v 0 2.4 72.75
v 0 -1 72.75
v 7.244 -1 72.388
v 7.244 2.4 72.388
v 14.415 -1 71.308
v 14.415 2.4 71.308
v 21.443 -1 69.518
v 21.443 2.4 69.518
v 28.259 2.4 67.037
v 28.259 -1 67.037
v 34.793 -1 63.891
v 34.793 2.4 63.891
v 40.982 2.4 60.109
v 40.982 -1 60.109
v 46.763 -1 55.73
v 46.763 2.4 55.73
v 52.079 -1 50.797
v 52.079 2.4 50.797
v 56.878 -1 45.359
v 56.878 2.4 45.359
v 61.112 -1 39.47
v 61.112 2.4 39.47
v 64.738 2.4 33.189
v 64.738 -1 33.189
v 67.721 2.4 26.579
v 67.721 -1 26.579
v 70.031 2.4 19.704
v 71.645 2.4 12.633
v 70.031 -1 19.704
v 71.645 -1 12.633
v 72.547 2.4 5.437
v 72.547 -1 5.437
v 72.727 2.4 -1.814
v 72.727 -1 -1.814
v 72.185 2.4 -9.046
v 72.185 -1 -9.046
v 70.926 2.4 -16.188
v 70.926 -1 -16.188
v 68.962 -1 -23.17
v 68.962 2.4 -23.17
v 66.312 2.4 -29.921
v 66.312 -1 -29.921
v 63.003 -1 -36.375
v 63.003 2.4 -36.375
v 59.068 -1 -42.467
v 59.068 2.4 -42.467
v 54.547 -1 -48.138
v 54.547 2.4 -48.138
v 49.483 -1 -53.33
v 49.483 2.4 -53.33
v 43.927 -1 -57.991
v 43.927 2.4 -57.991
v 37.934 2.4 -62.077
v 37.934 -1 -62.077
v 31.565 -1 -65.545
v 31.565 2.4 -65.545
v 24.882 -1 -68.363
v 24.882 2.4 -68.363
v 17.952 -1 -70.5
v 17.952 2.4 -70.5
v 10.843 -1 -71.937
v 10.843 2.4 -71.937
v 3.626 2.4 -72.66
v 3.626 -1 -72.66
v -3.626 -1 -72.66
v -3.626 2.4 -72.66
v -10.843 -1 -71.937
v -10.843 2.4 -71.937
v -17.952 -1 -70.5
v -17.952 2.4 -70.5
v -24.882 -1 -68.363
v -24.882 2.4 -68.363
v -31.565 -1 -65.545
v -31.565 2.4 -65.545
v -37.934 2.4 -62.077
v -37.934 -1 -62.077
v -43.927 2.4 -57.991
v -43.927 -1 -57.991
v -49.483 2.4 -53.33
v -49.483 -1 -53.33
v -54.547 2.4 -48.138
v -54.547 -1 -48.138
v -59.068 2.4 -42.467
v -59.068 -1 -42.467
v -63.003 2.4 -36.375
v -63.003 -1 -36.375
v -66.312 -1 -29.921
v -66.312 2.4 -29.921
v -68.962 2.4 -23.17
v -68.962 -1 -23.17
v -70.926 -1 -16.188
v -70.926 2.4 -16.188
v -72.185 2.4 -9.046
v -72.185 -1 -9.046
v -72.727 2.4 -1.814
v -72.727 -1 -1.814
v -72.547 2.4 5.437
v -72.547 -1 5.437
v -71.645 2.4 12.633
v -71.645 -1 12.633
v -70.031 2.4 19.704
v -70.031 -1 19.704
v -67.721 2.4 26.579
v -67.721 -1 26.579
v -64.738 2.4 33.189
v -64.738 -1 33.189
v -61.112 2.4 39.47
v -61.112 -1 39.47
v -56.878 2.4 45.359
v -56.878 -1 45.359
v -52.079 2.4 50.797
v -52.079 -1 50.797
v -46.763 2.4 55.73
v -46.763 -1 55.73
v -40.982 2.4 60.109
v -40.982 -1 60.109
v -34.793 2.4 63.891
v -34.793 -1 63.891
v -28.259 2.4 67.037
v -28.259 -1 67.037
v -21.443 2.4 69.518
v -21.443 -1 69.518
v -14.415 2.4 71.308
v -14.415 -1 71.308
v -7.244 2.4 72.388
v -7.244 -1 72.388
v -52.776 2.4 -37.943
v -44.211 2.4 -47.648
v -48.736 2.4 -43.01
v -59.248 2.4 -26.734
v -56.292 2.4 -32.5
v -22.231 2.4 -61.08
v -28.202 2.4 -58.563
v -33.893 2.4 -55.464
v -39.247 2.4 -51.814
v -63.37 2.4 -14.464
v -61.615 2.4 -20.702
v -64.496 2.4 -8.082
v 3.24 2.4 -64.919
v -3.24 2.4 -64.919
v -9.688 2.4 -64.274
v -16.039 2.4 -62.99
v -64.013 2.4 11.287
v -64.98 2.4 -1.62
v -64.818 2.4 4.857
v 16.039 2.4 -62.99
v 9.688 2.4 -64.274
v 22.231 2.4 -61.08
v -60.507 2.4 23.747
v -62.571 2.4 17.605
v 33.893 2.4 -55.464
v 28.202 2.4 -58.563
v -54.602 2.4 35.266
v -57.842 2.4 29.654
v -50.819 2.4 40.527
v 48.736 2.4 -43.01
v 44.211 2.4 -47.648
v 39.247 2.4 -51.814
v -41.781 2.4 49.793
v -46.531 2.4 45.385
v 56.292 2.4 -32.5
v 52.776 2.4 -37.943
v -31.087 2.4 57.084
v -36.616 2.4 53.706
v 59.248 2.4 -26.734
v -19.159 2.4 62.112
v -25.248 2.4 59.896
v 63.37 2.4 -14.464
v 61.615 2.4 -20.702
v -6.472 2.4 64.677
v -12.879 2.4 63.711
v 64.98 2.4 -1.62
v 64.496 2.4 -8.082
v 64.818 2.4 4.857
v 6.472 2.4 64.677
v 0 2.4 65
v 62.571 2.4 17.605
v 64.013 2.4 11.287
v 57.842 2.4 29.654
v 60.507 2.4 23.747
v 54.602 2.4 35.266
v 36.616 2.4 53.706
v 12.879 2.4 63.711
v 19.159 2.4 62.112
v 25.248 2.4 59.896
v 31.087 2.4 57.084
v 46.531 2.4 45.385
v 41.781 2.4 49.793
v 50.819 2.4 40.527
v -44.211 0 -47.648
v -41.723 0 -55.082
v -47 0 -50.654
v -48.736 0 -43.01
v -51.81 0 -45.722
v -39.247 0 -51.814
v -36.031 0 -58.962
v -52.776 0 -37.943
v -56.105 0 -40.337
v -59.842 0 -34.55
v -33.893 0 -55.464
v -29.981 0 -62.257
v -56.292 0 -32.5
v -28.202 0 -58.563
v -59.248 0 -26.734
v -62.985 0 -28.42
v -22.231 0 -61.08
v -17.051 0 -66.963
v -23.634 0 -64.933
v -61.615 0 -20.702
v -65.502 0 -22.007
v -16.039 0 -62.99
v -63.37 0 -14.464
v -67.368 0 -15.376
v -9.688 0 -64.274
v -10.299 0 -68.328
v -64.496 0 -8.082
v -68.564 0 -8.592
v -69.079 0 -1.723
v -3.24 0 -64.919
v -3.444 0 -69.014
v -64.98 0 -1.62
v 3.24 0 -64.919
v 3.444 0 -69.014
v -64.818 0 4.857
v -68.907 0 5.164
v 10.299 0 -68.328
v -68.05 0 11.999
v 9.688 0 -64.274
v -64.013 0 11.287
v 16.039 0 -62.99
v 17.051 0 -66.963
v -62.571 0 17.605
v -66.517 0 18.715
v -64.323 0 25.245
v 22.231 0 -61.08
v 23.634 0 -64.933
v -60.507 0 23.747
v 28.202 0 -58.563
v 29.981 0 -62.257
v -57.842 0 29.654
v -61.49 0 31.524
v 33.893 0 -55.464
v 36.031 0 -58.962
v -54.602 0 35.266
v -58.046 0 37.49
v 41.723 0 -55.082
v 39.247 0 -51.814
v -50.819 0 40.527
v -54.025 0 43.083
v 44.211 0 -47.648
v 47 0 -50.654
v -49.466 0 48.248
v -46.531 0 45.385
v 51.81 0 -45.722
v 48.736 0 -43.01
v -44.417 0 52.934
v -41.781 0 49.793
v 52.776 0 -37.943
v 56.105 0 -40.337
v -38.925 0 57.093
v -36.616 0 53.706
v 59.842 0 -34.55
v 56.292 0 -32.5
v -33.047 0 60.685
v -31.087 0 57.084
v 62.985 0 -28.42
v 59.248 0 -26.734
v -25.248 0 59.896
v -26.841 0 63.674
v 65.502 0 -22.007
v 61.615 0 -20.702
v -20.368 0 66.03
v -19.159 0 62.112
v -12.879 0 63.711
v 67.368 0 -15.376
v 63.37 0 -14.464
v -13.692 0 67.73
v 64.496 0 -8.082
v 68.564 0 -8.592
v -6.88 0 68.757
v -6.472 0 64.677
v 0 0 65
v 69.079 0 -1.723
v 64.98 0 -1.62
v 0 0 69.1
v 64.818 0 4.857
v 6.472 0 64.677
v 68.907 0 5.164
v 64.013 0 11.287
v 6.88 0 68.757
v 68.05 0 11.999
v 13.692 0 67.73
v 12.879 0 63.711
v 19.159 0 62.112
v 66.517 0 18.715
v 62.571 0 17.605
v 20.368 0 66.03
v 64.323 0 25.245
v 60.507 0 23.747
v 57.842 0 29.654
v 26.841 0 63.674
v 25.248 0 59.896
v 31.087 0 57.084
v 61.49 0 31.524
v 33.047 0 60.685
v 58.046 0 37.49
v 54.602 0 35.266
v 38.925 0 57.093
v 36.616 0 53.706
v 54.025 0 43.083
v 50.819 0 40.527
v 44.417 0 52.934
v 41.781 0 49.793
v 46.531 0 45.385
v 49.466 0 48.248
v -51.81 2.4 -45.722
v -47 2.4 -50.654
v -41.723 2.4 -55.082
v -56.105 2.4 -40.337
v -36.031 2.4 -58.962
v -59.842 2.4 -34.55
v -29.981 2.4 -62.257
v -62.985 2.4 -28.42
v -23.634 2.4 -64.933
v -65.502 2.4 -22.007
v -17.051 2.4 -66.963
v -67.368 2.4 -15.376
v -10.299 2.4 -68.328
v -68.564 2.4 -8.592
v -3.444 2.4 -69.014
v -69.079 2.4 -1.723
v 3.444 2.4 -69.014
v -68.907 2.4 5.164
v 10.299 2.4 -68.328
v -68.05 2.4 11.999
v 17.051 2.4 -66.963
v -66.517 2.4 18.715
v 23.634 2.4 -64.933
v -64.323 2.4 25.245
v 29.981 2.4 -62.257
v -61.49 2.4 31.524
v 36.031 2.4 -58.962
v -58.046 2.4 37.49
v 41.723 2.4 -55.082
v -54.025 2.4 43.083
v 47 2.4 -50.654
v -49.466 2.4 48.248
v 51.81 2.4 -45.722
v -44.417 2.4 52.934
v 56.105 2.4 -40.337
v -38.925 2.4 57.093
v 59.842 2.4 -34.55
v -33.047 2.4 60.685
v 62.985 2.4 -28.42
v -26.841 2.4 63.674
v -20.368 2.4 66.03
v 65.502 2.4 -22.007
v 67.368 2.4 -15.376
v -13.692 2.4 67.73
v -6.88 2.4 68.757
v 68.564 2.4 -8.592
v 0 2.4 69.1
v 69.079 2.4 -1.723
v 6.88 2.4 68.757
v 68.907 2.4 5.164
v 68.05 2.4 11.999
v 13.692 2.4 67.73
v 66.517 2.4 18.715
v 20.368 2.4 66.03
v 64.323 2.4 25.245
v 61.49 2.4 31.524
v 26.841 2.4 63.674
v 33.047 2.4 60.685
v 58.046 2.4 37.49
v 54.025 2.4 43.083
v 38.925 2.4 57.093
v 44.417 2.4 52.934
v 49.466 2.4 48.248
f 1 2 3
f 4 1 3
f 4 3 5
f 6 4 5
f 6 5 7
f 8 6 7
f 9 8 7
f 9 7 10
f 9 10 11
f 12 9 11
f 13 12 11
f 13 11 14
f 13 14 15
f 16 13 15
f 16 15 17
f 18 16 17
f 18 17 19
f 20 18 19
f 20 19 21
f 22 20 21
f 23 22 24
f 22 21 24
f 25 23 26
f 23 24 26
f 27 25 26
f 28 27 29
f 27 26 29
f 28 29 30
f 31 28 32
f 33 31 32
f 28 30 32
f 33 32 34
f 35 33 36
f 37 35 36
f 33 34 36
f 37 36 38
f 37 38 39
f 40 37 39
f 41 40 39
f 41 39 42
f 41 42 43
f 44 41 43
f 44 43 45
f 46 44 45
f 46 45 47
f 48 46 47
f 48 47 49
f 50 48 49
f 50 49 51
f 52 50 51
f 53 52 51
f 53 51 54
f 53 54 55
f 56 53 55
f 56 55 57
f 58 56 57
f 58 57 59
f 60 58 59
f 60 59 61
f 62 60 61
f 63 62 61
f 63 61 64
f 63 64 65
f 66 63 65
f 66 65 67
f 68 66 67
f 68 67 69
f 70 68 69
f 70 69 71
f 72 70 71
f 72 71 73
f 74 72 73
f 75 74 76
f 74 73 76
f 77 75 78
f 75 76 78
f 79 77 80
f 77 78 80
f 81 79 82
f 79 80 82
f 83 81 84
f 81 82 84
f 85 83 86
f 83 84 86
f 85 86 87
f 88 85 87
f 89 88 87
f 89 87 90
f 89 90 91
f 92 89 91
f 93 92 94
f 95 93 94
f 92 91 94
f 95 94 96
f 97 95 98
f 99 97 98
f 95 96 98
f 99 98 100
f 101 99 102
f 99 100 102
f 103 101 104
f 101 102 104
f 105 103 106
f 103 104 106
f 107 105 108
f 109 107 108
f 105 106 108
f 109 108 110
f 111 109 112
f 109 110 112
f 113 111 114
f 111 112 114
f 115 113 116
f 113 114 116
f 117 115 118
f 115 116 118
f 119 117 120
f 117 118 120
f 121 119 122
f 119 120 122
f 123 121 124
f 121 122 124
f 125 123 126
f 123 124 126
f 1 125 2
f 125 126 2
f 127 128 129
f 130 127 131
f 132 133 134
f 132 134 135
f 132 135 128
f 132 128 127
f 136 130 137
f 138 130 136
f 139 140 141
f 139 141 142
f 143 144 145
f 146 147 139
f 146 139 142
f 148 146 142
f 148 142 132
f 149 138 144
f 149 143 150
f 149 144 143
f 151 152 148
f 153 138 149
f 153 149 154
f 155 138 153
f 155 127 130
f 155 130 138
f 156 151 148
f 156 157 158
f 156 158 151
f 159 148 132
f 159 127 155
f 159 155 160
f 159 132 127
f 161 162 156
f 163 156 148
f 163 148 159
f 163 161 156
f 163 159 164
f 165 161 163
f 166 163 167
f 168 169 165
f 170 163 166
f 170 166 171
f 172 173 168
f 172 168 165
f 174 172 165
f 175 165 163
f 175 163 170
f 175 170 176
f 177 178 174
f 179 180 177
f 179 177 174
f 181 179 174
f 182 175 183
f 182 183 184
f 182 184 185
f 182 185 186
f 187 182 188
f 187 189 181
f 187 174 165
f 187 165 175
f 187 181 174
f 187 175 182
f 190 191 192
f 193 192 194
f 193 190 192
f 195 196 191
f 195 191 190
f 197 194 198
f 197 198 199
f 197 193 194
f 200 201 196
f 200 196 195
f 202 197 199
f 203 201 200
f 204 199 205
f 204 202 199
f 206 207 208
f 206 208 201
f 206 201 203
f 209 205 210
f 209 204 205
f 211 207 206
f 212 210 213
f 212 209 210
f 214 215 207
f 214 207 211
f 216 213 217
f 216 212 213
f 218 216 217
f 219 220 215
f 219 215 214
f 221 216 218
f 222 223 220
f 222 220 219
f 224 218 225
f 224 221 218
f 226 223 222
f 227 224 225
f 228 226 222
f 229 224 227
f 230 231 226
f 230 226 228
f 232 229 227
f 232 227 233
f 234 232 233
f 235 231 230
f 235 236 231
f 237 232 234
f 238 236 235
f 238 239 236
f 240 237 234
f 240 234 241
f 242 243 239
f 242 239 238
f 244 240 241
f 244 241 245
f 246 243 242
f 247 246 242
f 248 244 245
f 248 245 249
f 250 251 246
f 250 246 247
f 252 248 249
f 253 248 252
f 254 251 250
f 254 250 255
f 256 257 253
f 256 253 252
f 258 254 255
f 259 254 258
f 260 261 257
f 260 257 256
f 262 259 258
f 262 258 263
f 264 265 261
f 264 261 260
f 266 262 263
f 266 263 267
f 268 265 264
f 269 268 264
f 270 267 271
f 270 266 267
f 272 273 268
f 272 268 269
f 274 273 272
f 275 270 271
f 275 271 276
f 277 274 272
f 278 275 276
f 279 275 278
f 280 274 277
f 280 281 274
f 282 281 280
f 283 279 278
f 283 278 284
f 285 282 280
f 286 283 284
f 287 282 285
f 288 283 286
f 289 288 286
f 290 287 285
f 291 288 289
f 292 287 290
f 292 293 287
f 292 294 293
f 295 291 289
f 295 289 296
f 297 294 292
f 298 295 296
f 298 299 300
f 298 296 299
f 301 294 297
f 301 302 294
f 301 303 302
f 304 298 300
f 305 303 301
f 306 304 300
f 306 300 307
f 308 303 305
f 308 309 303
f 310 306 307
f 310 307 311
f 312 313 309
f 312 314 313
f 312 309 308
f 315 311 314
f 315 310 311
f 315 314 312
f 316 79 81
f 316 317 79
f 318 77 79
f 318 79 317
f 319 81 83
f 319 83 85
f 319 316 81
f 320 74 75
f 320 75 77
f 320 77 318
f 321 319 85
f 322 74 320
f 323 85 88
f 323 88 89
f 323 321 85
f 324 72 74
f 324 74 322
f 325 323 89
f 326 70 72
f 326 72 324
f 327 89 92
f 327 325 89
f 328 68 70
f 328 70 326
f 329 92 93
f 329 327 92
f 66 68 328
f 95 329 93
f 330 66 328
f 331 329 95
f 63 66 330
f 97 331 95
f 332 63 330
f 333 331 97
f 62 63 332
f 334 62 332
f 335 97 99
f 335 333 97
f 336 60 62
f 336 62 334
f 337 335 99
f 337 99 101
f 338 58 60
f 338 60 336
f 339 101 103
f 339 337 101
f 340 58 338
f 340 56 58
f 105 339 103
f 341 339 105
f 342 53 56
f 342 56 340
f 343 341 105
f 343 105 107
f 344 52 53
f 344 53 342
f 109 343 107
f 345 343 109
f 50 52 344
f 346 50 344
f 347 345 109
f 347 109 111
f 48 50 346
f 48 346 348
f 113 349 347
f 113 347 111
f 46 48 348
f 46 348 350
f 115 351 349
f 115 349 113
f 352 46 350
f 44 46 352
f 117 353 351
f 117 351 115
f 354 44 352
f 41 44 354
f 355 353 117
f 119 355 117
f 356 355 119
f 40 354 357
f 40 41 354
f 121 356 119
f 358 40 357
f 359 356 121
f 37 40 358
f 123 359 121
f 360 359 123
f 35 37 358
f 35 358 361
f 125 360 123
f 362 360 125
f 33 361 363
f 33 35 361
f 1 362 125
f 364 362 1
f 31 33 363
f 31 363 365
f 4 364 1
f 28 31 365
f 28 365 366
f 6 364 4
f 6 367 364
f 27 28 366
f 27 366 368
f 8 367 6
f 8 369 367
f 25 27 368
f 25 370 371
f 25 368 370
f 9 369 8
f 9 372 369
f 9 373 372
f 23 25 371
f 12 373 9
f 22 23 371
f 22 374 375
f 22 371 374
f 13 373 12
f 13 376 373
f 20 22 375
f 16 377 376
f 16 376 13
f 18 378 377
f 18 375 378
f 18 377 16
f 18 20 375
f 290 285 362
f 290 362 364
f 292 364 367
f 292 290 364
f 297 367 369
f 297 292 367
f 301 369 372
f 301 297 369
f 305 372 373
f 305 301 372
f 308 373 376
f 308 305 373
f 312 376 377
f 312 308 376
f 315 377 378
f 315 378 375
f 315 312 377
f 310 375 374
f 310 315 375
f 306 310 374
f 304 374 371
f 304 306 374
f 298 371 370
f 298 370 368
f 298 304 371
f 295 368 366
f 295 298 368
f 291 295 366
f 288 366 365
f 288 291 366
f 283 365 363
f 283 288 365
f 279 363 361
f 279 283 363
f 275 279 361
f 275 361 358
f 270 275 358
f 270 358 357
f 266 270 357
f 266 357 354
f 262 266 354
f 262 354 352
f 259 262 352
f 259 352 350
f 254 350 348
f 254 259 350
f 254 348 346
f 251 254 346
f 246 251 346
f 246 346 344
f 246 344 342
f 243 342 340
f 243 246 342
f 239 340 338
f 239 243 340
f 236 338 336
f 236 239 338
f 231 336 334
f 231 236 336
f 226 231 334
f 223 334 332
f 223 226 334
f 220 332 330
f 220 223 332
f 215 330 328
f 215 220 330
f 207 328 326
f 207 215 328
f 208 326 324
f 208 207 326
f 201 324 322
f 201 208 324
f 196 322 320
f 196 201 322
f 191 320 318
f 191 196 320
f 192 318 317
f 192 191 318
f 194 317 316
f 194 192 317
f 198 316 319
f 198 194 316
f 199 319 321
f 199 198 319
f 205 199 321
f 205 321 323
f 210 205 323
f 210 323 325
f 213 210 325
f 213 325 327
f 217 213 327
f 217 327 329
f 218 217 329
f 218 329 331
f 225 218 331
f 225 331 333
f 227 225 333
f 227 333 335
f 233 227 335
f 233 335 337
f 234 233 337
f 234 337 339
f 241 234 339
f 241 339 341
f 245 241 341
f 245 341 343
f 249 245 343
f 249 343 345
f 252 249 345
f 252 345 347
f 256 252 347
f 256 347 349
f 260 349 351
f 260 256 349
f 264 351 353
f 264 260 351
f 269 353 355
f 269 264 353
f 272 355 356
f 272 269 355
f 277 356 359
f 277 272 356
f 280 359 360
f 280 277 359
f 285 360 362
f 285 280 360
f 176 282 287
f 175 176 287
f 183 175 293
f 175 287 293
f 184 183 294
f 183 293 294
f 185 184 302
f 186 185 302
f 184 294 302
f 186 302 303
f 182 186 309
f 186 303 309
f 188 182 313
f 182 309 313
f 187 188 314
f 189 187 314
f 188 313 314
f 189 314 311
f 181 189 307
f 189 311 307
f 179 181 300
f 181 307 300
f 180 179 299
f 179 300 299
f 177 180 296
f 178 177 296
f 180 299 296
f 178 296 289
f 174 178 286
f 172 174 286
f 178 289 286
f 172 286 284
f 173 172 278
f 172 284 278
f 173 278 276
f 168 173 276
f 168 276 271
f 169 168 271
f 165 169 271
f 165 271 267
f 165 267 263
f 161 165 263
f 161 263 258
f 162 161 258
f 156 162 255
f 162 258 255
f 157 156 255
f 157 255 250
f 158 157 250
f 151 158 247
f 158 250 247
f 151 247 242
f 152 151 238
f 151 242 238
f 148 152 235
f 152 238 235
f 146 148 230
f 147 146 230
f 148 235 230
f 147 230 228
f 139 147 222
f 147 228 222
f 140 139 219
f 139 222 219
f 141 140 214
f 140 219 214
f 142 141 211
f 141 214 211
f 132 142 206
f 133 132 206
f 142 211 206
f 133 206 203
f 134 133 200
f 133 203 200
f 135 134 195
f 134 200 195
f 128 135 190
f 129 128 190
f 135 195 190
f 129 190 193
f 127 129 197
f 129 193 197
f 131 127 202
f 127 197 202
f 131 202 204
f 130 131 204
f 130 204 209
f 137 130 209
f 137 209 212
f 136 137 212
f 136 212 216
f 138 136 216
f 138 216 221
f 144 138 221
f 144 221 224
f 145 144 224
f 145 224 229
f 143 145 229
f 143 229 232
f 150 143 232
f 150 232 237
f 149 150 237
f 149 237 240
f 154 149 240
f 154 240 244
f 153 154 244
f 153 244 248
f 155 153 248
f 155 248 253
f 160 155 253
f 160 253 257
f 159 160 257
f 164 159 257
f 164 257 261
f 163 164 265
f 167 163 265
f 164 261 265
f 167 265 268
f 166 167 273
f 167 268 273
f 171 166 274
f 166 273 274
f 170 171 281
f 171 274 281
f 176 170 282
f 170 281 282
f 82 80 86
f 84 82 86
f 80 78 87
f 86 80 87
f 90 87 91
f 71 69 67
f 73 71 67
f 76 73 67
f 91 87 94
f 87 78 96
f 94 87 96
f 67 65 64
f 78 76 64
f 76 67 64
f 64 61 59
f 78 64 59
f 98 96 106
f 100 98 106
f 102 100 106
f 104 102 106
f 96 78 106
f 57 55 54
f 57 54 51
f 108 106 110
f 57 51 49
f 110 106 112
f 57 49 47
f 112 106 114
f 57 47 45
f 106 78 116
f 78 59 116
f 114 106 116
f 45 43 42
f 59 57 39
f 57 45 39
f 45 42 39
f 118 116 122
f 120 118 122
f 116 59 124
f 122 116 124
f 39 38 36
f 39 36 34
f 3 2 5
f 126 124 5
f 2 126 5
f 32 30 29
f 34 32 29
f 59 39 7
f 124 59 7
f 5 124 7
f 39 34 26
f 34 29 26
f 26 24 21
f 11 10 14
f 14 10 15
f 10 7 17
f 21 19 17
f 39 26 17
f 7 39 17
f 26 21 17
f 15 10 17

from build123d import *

# Parameters (mm, degrees)
SKETCH_6_R      = 72.75
SKETCH_6_R_2    = 69.1
EXTRUDE_4_DEPTH = 2.4
SKETCH_6_3_R    = 65
EXTRUDE_5_DEPTH = 2.4
EXTRUDE_START   = -1
SKETCH_6_4_R    = 72.75
EXTRUDE_6_DEPTH = 1


with BuildPart() as part:
    # 草圖6 → 填料-伸長4 (new body)
    with BuildSketch(Plane(origin=(0, 0, 0), x_dir=(1, 0, 0), z_dir=(0, 1, 0))):
        Circle(SKETCH_6_R)
        Circle(SKETCH_6_R_2, mode=Mode.SUBTRACT)
    extrude(amount=EXTRUDE_4_DEPTH)



with BuildPart() as body_2:
    # 草圖6<3> → 填料-伸長5 (new body)
    with BuildSketch(Plane(origin=(0, 0, 0), x_dir=(1, 0, 0), z_dir=(0, 1, 0))):
        Circle(SKETCH_6_3_R)
    extrude(amount=EXTRUDE_5_DEPTH)


with BuildPart() as part_1:
    add(part.part)

    add(body_2.part)  # 填料-伸長6 merges body 2
    # 草圖6<4> → 填料-伸長6 (add)
    with BuildSketch(Plane(origin=(0, 0, 0), x_dir=(1, 0, 0), z_dir=(0, 1, 0)).offset(EXTRUDE_START)):
        Circle(SKETCH_6_4_R)
    extrude(amount=EXTRUDE_6_DEPTH)


solid = part_1.part
